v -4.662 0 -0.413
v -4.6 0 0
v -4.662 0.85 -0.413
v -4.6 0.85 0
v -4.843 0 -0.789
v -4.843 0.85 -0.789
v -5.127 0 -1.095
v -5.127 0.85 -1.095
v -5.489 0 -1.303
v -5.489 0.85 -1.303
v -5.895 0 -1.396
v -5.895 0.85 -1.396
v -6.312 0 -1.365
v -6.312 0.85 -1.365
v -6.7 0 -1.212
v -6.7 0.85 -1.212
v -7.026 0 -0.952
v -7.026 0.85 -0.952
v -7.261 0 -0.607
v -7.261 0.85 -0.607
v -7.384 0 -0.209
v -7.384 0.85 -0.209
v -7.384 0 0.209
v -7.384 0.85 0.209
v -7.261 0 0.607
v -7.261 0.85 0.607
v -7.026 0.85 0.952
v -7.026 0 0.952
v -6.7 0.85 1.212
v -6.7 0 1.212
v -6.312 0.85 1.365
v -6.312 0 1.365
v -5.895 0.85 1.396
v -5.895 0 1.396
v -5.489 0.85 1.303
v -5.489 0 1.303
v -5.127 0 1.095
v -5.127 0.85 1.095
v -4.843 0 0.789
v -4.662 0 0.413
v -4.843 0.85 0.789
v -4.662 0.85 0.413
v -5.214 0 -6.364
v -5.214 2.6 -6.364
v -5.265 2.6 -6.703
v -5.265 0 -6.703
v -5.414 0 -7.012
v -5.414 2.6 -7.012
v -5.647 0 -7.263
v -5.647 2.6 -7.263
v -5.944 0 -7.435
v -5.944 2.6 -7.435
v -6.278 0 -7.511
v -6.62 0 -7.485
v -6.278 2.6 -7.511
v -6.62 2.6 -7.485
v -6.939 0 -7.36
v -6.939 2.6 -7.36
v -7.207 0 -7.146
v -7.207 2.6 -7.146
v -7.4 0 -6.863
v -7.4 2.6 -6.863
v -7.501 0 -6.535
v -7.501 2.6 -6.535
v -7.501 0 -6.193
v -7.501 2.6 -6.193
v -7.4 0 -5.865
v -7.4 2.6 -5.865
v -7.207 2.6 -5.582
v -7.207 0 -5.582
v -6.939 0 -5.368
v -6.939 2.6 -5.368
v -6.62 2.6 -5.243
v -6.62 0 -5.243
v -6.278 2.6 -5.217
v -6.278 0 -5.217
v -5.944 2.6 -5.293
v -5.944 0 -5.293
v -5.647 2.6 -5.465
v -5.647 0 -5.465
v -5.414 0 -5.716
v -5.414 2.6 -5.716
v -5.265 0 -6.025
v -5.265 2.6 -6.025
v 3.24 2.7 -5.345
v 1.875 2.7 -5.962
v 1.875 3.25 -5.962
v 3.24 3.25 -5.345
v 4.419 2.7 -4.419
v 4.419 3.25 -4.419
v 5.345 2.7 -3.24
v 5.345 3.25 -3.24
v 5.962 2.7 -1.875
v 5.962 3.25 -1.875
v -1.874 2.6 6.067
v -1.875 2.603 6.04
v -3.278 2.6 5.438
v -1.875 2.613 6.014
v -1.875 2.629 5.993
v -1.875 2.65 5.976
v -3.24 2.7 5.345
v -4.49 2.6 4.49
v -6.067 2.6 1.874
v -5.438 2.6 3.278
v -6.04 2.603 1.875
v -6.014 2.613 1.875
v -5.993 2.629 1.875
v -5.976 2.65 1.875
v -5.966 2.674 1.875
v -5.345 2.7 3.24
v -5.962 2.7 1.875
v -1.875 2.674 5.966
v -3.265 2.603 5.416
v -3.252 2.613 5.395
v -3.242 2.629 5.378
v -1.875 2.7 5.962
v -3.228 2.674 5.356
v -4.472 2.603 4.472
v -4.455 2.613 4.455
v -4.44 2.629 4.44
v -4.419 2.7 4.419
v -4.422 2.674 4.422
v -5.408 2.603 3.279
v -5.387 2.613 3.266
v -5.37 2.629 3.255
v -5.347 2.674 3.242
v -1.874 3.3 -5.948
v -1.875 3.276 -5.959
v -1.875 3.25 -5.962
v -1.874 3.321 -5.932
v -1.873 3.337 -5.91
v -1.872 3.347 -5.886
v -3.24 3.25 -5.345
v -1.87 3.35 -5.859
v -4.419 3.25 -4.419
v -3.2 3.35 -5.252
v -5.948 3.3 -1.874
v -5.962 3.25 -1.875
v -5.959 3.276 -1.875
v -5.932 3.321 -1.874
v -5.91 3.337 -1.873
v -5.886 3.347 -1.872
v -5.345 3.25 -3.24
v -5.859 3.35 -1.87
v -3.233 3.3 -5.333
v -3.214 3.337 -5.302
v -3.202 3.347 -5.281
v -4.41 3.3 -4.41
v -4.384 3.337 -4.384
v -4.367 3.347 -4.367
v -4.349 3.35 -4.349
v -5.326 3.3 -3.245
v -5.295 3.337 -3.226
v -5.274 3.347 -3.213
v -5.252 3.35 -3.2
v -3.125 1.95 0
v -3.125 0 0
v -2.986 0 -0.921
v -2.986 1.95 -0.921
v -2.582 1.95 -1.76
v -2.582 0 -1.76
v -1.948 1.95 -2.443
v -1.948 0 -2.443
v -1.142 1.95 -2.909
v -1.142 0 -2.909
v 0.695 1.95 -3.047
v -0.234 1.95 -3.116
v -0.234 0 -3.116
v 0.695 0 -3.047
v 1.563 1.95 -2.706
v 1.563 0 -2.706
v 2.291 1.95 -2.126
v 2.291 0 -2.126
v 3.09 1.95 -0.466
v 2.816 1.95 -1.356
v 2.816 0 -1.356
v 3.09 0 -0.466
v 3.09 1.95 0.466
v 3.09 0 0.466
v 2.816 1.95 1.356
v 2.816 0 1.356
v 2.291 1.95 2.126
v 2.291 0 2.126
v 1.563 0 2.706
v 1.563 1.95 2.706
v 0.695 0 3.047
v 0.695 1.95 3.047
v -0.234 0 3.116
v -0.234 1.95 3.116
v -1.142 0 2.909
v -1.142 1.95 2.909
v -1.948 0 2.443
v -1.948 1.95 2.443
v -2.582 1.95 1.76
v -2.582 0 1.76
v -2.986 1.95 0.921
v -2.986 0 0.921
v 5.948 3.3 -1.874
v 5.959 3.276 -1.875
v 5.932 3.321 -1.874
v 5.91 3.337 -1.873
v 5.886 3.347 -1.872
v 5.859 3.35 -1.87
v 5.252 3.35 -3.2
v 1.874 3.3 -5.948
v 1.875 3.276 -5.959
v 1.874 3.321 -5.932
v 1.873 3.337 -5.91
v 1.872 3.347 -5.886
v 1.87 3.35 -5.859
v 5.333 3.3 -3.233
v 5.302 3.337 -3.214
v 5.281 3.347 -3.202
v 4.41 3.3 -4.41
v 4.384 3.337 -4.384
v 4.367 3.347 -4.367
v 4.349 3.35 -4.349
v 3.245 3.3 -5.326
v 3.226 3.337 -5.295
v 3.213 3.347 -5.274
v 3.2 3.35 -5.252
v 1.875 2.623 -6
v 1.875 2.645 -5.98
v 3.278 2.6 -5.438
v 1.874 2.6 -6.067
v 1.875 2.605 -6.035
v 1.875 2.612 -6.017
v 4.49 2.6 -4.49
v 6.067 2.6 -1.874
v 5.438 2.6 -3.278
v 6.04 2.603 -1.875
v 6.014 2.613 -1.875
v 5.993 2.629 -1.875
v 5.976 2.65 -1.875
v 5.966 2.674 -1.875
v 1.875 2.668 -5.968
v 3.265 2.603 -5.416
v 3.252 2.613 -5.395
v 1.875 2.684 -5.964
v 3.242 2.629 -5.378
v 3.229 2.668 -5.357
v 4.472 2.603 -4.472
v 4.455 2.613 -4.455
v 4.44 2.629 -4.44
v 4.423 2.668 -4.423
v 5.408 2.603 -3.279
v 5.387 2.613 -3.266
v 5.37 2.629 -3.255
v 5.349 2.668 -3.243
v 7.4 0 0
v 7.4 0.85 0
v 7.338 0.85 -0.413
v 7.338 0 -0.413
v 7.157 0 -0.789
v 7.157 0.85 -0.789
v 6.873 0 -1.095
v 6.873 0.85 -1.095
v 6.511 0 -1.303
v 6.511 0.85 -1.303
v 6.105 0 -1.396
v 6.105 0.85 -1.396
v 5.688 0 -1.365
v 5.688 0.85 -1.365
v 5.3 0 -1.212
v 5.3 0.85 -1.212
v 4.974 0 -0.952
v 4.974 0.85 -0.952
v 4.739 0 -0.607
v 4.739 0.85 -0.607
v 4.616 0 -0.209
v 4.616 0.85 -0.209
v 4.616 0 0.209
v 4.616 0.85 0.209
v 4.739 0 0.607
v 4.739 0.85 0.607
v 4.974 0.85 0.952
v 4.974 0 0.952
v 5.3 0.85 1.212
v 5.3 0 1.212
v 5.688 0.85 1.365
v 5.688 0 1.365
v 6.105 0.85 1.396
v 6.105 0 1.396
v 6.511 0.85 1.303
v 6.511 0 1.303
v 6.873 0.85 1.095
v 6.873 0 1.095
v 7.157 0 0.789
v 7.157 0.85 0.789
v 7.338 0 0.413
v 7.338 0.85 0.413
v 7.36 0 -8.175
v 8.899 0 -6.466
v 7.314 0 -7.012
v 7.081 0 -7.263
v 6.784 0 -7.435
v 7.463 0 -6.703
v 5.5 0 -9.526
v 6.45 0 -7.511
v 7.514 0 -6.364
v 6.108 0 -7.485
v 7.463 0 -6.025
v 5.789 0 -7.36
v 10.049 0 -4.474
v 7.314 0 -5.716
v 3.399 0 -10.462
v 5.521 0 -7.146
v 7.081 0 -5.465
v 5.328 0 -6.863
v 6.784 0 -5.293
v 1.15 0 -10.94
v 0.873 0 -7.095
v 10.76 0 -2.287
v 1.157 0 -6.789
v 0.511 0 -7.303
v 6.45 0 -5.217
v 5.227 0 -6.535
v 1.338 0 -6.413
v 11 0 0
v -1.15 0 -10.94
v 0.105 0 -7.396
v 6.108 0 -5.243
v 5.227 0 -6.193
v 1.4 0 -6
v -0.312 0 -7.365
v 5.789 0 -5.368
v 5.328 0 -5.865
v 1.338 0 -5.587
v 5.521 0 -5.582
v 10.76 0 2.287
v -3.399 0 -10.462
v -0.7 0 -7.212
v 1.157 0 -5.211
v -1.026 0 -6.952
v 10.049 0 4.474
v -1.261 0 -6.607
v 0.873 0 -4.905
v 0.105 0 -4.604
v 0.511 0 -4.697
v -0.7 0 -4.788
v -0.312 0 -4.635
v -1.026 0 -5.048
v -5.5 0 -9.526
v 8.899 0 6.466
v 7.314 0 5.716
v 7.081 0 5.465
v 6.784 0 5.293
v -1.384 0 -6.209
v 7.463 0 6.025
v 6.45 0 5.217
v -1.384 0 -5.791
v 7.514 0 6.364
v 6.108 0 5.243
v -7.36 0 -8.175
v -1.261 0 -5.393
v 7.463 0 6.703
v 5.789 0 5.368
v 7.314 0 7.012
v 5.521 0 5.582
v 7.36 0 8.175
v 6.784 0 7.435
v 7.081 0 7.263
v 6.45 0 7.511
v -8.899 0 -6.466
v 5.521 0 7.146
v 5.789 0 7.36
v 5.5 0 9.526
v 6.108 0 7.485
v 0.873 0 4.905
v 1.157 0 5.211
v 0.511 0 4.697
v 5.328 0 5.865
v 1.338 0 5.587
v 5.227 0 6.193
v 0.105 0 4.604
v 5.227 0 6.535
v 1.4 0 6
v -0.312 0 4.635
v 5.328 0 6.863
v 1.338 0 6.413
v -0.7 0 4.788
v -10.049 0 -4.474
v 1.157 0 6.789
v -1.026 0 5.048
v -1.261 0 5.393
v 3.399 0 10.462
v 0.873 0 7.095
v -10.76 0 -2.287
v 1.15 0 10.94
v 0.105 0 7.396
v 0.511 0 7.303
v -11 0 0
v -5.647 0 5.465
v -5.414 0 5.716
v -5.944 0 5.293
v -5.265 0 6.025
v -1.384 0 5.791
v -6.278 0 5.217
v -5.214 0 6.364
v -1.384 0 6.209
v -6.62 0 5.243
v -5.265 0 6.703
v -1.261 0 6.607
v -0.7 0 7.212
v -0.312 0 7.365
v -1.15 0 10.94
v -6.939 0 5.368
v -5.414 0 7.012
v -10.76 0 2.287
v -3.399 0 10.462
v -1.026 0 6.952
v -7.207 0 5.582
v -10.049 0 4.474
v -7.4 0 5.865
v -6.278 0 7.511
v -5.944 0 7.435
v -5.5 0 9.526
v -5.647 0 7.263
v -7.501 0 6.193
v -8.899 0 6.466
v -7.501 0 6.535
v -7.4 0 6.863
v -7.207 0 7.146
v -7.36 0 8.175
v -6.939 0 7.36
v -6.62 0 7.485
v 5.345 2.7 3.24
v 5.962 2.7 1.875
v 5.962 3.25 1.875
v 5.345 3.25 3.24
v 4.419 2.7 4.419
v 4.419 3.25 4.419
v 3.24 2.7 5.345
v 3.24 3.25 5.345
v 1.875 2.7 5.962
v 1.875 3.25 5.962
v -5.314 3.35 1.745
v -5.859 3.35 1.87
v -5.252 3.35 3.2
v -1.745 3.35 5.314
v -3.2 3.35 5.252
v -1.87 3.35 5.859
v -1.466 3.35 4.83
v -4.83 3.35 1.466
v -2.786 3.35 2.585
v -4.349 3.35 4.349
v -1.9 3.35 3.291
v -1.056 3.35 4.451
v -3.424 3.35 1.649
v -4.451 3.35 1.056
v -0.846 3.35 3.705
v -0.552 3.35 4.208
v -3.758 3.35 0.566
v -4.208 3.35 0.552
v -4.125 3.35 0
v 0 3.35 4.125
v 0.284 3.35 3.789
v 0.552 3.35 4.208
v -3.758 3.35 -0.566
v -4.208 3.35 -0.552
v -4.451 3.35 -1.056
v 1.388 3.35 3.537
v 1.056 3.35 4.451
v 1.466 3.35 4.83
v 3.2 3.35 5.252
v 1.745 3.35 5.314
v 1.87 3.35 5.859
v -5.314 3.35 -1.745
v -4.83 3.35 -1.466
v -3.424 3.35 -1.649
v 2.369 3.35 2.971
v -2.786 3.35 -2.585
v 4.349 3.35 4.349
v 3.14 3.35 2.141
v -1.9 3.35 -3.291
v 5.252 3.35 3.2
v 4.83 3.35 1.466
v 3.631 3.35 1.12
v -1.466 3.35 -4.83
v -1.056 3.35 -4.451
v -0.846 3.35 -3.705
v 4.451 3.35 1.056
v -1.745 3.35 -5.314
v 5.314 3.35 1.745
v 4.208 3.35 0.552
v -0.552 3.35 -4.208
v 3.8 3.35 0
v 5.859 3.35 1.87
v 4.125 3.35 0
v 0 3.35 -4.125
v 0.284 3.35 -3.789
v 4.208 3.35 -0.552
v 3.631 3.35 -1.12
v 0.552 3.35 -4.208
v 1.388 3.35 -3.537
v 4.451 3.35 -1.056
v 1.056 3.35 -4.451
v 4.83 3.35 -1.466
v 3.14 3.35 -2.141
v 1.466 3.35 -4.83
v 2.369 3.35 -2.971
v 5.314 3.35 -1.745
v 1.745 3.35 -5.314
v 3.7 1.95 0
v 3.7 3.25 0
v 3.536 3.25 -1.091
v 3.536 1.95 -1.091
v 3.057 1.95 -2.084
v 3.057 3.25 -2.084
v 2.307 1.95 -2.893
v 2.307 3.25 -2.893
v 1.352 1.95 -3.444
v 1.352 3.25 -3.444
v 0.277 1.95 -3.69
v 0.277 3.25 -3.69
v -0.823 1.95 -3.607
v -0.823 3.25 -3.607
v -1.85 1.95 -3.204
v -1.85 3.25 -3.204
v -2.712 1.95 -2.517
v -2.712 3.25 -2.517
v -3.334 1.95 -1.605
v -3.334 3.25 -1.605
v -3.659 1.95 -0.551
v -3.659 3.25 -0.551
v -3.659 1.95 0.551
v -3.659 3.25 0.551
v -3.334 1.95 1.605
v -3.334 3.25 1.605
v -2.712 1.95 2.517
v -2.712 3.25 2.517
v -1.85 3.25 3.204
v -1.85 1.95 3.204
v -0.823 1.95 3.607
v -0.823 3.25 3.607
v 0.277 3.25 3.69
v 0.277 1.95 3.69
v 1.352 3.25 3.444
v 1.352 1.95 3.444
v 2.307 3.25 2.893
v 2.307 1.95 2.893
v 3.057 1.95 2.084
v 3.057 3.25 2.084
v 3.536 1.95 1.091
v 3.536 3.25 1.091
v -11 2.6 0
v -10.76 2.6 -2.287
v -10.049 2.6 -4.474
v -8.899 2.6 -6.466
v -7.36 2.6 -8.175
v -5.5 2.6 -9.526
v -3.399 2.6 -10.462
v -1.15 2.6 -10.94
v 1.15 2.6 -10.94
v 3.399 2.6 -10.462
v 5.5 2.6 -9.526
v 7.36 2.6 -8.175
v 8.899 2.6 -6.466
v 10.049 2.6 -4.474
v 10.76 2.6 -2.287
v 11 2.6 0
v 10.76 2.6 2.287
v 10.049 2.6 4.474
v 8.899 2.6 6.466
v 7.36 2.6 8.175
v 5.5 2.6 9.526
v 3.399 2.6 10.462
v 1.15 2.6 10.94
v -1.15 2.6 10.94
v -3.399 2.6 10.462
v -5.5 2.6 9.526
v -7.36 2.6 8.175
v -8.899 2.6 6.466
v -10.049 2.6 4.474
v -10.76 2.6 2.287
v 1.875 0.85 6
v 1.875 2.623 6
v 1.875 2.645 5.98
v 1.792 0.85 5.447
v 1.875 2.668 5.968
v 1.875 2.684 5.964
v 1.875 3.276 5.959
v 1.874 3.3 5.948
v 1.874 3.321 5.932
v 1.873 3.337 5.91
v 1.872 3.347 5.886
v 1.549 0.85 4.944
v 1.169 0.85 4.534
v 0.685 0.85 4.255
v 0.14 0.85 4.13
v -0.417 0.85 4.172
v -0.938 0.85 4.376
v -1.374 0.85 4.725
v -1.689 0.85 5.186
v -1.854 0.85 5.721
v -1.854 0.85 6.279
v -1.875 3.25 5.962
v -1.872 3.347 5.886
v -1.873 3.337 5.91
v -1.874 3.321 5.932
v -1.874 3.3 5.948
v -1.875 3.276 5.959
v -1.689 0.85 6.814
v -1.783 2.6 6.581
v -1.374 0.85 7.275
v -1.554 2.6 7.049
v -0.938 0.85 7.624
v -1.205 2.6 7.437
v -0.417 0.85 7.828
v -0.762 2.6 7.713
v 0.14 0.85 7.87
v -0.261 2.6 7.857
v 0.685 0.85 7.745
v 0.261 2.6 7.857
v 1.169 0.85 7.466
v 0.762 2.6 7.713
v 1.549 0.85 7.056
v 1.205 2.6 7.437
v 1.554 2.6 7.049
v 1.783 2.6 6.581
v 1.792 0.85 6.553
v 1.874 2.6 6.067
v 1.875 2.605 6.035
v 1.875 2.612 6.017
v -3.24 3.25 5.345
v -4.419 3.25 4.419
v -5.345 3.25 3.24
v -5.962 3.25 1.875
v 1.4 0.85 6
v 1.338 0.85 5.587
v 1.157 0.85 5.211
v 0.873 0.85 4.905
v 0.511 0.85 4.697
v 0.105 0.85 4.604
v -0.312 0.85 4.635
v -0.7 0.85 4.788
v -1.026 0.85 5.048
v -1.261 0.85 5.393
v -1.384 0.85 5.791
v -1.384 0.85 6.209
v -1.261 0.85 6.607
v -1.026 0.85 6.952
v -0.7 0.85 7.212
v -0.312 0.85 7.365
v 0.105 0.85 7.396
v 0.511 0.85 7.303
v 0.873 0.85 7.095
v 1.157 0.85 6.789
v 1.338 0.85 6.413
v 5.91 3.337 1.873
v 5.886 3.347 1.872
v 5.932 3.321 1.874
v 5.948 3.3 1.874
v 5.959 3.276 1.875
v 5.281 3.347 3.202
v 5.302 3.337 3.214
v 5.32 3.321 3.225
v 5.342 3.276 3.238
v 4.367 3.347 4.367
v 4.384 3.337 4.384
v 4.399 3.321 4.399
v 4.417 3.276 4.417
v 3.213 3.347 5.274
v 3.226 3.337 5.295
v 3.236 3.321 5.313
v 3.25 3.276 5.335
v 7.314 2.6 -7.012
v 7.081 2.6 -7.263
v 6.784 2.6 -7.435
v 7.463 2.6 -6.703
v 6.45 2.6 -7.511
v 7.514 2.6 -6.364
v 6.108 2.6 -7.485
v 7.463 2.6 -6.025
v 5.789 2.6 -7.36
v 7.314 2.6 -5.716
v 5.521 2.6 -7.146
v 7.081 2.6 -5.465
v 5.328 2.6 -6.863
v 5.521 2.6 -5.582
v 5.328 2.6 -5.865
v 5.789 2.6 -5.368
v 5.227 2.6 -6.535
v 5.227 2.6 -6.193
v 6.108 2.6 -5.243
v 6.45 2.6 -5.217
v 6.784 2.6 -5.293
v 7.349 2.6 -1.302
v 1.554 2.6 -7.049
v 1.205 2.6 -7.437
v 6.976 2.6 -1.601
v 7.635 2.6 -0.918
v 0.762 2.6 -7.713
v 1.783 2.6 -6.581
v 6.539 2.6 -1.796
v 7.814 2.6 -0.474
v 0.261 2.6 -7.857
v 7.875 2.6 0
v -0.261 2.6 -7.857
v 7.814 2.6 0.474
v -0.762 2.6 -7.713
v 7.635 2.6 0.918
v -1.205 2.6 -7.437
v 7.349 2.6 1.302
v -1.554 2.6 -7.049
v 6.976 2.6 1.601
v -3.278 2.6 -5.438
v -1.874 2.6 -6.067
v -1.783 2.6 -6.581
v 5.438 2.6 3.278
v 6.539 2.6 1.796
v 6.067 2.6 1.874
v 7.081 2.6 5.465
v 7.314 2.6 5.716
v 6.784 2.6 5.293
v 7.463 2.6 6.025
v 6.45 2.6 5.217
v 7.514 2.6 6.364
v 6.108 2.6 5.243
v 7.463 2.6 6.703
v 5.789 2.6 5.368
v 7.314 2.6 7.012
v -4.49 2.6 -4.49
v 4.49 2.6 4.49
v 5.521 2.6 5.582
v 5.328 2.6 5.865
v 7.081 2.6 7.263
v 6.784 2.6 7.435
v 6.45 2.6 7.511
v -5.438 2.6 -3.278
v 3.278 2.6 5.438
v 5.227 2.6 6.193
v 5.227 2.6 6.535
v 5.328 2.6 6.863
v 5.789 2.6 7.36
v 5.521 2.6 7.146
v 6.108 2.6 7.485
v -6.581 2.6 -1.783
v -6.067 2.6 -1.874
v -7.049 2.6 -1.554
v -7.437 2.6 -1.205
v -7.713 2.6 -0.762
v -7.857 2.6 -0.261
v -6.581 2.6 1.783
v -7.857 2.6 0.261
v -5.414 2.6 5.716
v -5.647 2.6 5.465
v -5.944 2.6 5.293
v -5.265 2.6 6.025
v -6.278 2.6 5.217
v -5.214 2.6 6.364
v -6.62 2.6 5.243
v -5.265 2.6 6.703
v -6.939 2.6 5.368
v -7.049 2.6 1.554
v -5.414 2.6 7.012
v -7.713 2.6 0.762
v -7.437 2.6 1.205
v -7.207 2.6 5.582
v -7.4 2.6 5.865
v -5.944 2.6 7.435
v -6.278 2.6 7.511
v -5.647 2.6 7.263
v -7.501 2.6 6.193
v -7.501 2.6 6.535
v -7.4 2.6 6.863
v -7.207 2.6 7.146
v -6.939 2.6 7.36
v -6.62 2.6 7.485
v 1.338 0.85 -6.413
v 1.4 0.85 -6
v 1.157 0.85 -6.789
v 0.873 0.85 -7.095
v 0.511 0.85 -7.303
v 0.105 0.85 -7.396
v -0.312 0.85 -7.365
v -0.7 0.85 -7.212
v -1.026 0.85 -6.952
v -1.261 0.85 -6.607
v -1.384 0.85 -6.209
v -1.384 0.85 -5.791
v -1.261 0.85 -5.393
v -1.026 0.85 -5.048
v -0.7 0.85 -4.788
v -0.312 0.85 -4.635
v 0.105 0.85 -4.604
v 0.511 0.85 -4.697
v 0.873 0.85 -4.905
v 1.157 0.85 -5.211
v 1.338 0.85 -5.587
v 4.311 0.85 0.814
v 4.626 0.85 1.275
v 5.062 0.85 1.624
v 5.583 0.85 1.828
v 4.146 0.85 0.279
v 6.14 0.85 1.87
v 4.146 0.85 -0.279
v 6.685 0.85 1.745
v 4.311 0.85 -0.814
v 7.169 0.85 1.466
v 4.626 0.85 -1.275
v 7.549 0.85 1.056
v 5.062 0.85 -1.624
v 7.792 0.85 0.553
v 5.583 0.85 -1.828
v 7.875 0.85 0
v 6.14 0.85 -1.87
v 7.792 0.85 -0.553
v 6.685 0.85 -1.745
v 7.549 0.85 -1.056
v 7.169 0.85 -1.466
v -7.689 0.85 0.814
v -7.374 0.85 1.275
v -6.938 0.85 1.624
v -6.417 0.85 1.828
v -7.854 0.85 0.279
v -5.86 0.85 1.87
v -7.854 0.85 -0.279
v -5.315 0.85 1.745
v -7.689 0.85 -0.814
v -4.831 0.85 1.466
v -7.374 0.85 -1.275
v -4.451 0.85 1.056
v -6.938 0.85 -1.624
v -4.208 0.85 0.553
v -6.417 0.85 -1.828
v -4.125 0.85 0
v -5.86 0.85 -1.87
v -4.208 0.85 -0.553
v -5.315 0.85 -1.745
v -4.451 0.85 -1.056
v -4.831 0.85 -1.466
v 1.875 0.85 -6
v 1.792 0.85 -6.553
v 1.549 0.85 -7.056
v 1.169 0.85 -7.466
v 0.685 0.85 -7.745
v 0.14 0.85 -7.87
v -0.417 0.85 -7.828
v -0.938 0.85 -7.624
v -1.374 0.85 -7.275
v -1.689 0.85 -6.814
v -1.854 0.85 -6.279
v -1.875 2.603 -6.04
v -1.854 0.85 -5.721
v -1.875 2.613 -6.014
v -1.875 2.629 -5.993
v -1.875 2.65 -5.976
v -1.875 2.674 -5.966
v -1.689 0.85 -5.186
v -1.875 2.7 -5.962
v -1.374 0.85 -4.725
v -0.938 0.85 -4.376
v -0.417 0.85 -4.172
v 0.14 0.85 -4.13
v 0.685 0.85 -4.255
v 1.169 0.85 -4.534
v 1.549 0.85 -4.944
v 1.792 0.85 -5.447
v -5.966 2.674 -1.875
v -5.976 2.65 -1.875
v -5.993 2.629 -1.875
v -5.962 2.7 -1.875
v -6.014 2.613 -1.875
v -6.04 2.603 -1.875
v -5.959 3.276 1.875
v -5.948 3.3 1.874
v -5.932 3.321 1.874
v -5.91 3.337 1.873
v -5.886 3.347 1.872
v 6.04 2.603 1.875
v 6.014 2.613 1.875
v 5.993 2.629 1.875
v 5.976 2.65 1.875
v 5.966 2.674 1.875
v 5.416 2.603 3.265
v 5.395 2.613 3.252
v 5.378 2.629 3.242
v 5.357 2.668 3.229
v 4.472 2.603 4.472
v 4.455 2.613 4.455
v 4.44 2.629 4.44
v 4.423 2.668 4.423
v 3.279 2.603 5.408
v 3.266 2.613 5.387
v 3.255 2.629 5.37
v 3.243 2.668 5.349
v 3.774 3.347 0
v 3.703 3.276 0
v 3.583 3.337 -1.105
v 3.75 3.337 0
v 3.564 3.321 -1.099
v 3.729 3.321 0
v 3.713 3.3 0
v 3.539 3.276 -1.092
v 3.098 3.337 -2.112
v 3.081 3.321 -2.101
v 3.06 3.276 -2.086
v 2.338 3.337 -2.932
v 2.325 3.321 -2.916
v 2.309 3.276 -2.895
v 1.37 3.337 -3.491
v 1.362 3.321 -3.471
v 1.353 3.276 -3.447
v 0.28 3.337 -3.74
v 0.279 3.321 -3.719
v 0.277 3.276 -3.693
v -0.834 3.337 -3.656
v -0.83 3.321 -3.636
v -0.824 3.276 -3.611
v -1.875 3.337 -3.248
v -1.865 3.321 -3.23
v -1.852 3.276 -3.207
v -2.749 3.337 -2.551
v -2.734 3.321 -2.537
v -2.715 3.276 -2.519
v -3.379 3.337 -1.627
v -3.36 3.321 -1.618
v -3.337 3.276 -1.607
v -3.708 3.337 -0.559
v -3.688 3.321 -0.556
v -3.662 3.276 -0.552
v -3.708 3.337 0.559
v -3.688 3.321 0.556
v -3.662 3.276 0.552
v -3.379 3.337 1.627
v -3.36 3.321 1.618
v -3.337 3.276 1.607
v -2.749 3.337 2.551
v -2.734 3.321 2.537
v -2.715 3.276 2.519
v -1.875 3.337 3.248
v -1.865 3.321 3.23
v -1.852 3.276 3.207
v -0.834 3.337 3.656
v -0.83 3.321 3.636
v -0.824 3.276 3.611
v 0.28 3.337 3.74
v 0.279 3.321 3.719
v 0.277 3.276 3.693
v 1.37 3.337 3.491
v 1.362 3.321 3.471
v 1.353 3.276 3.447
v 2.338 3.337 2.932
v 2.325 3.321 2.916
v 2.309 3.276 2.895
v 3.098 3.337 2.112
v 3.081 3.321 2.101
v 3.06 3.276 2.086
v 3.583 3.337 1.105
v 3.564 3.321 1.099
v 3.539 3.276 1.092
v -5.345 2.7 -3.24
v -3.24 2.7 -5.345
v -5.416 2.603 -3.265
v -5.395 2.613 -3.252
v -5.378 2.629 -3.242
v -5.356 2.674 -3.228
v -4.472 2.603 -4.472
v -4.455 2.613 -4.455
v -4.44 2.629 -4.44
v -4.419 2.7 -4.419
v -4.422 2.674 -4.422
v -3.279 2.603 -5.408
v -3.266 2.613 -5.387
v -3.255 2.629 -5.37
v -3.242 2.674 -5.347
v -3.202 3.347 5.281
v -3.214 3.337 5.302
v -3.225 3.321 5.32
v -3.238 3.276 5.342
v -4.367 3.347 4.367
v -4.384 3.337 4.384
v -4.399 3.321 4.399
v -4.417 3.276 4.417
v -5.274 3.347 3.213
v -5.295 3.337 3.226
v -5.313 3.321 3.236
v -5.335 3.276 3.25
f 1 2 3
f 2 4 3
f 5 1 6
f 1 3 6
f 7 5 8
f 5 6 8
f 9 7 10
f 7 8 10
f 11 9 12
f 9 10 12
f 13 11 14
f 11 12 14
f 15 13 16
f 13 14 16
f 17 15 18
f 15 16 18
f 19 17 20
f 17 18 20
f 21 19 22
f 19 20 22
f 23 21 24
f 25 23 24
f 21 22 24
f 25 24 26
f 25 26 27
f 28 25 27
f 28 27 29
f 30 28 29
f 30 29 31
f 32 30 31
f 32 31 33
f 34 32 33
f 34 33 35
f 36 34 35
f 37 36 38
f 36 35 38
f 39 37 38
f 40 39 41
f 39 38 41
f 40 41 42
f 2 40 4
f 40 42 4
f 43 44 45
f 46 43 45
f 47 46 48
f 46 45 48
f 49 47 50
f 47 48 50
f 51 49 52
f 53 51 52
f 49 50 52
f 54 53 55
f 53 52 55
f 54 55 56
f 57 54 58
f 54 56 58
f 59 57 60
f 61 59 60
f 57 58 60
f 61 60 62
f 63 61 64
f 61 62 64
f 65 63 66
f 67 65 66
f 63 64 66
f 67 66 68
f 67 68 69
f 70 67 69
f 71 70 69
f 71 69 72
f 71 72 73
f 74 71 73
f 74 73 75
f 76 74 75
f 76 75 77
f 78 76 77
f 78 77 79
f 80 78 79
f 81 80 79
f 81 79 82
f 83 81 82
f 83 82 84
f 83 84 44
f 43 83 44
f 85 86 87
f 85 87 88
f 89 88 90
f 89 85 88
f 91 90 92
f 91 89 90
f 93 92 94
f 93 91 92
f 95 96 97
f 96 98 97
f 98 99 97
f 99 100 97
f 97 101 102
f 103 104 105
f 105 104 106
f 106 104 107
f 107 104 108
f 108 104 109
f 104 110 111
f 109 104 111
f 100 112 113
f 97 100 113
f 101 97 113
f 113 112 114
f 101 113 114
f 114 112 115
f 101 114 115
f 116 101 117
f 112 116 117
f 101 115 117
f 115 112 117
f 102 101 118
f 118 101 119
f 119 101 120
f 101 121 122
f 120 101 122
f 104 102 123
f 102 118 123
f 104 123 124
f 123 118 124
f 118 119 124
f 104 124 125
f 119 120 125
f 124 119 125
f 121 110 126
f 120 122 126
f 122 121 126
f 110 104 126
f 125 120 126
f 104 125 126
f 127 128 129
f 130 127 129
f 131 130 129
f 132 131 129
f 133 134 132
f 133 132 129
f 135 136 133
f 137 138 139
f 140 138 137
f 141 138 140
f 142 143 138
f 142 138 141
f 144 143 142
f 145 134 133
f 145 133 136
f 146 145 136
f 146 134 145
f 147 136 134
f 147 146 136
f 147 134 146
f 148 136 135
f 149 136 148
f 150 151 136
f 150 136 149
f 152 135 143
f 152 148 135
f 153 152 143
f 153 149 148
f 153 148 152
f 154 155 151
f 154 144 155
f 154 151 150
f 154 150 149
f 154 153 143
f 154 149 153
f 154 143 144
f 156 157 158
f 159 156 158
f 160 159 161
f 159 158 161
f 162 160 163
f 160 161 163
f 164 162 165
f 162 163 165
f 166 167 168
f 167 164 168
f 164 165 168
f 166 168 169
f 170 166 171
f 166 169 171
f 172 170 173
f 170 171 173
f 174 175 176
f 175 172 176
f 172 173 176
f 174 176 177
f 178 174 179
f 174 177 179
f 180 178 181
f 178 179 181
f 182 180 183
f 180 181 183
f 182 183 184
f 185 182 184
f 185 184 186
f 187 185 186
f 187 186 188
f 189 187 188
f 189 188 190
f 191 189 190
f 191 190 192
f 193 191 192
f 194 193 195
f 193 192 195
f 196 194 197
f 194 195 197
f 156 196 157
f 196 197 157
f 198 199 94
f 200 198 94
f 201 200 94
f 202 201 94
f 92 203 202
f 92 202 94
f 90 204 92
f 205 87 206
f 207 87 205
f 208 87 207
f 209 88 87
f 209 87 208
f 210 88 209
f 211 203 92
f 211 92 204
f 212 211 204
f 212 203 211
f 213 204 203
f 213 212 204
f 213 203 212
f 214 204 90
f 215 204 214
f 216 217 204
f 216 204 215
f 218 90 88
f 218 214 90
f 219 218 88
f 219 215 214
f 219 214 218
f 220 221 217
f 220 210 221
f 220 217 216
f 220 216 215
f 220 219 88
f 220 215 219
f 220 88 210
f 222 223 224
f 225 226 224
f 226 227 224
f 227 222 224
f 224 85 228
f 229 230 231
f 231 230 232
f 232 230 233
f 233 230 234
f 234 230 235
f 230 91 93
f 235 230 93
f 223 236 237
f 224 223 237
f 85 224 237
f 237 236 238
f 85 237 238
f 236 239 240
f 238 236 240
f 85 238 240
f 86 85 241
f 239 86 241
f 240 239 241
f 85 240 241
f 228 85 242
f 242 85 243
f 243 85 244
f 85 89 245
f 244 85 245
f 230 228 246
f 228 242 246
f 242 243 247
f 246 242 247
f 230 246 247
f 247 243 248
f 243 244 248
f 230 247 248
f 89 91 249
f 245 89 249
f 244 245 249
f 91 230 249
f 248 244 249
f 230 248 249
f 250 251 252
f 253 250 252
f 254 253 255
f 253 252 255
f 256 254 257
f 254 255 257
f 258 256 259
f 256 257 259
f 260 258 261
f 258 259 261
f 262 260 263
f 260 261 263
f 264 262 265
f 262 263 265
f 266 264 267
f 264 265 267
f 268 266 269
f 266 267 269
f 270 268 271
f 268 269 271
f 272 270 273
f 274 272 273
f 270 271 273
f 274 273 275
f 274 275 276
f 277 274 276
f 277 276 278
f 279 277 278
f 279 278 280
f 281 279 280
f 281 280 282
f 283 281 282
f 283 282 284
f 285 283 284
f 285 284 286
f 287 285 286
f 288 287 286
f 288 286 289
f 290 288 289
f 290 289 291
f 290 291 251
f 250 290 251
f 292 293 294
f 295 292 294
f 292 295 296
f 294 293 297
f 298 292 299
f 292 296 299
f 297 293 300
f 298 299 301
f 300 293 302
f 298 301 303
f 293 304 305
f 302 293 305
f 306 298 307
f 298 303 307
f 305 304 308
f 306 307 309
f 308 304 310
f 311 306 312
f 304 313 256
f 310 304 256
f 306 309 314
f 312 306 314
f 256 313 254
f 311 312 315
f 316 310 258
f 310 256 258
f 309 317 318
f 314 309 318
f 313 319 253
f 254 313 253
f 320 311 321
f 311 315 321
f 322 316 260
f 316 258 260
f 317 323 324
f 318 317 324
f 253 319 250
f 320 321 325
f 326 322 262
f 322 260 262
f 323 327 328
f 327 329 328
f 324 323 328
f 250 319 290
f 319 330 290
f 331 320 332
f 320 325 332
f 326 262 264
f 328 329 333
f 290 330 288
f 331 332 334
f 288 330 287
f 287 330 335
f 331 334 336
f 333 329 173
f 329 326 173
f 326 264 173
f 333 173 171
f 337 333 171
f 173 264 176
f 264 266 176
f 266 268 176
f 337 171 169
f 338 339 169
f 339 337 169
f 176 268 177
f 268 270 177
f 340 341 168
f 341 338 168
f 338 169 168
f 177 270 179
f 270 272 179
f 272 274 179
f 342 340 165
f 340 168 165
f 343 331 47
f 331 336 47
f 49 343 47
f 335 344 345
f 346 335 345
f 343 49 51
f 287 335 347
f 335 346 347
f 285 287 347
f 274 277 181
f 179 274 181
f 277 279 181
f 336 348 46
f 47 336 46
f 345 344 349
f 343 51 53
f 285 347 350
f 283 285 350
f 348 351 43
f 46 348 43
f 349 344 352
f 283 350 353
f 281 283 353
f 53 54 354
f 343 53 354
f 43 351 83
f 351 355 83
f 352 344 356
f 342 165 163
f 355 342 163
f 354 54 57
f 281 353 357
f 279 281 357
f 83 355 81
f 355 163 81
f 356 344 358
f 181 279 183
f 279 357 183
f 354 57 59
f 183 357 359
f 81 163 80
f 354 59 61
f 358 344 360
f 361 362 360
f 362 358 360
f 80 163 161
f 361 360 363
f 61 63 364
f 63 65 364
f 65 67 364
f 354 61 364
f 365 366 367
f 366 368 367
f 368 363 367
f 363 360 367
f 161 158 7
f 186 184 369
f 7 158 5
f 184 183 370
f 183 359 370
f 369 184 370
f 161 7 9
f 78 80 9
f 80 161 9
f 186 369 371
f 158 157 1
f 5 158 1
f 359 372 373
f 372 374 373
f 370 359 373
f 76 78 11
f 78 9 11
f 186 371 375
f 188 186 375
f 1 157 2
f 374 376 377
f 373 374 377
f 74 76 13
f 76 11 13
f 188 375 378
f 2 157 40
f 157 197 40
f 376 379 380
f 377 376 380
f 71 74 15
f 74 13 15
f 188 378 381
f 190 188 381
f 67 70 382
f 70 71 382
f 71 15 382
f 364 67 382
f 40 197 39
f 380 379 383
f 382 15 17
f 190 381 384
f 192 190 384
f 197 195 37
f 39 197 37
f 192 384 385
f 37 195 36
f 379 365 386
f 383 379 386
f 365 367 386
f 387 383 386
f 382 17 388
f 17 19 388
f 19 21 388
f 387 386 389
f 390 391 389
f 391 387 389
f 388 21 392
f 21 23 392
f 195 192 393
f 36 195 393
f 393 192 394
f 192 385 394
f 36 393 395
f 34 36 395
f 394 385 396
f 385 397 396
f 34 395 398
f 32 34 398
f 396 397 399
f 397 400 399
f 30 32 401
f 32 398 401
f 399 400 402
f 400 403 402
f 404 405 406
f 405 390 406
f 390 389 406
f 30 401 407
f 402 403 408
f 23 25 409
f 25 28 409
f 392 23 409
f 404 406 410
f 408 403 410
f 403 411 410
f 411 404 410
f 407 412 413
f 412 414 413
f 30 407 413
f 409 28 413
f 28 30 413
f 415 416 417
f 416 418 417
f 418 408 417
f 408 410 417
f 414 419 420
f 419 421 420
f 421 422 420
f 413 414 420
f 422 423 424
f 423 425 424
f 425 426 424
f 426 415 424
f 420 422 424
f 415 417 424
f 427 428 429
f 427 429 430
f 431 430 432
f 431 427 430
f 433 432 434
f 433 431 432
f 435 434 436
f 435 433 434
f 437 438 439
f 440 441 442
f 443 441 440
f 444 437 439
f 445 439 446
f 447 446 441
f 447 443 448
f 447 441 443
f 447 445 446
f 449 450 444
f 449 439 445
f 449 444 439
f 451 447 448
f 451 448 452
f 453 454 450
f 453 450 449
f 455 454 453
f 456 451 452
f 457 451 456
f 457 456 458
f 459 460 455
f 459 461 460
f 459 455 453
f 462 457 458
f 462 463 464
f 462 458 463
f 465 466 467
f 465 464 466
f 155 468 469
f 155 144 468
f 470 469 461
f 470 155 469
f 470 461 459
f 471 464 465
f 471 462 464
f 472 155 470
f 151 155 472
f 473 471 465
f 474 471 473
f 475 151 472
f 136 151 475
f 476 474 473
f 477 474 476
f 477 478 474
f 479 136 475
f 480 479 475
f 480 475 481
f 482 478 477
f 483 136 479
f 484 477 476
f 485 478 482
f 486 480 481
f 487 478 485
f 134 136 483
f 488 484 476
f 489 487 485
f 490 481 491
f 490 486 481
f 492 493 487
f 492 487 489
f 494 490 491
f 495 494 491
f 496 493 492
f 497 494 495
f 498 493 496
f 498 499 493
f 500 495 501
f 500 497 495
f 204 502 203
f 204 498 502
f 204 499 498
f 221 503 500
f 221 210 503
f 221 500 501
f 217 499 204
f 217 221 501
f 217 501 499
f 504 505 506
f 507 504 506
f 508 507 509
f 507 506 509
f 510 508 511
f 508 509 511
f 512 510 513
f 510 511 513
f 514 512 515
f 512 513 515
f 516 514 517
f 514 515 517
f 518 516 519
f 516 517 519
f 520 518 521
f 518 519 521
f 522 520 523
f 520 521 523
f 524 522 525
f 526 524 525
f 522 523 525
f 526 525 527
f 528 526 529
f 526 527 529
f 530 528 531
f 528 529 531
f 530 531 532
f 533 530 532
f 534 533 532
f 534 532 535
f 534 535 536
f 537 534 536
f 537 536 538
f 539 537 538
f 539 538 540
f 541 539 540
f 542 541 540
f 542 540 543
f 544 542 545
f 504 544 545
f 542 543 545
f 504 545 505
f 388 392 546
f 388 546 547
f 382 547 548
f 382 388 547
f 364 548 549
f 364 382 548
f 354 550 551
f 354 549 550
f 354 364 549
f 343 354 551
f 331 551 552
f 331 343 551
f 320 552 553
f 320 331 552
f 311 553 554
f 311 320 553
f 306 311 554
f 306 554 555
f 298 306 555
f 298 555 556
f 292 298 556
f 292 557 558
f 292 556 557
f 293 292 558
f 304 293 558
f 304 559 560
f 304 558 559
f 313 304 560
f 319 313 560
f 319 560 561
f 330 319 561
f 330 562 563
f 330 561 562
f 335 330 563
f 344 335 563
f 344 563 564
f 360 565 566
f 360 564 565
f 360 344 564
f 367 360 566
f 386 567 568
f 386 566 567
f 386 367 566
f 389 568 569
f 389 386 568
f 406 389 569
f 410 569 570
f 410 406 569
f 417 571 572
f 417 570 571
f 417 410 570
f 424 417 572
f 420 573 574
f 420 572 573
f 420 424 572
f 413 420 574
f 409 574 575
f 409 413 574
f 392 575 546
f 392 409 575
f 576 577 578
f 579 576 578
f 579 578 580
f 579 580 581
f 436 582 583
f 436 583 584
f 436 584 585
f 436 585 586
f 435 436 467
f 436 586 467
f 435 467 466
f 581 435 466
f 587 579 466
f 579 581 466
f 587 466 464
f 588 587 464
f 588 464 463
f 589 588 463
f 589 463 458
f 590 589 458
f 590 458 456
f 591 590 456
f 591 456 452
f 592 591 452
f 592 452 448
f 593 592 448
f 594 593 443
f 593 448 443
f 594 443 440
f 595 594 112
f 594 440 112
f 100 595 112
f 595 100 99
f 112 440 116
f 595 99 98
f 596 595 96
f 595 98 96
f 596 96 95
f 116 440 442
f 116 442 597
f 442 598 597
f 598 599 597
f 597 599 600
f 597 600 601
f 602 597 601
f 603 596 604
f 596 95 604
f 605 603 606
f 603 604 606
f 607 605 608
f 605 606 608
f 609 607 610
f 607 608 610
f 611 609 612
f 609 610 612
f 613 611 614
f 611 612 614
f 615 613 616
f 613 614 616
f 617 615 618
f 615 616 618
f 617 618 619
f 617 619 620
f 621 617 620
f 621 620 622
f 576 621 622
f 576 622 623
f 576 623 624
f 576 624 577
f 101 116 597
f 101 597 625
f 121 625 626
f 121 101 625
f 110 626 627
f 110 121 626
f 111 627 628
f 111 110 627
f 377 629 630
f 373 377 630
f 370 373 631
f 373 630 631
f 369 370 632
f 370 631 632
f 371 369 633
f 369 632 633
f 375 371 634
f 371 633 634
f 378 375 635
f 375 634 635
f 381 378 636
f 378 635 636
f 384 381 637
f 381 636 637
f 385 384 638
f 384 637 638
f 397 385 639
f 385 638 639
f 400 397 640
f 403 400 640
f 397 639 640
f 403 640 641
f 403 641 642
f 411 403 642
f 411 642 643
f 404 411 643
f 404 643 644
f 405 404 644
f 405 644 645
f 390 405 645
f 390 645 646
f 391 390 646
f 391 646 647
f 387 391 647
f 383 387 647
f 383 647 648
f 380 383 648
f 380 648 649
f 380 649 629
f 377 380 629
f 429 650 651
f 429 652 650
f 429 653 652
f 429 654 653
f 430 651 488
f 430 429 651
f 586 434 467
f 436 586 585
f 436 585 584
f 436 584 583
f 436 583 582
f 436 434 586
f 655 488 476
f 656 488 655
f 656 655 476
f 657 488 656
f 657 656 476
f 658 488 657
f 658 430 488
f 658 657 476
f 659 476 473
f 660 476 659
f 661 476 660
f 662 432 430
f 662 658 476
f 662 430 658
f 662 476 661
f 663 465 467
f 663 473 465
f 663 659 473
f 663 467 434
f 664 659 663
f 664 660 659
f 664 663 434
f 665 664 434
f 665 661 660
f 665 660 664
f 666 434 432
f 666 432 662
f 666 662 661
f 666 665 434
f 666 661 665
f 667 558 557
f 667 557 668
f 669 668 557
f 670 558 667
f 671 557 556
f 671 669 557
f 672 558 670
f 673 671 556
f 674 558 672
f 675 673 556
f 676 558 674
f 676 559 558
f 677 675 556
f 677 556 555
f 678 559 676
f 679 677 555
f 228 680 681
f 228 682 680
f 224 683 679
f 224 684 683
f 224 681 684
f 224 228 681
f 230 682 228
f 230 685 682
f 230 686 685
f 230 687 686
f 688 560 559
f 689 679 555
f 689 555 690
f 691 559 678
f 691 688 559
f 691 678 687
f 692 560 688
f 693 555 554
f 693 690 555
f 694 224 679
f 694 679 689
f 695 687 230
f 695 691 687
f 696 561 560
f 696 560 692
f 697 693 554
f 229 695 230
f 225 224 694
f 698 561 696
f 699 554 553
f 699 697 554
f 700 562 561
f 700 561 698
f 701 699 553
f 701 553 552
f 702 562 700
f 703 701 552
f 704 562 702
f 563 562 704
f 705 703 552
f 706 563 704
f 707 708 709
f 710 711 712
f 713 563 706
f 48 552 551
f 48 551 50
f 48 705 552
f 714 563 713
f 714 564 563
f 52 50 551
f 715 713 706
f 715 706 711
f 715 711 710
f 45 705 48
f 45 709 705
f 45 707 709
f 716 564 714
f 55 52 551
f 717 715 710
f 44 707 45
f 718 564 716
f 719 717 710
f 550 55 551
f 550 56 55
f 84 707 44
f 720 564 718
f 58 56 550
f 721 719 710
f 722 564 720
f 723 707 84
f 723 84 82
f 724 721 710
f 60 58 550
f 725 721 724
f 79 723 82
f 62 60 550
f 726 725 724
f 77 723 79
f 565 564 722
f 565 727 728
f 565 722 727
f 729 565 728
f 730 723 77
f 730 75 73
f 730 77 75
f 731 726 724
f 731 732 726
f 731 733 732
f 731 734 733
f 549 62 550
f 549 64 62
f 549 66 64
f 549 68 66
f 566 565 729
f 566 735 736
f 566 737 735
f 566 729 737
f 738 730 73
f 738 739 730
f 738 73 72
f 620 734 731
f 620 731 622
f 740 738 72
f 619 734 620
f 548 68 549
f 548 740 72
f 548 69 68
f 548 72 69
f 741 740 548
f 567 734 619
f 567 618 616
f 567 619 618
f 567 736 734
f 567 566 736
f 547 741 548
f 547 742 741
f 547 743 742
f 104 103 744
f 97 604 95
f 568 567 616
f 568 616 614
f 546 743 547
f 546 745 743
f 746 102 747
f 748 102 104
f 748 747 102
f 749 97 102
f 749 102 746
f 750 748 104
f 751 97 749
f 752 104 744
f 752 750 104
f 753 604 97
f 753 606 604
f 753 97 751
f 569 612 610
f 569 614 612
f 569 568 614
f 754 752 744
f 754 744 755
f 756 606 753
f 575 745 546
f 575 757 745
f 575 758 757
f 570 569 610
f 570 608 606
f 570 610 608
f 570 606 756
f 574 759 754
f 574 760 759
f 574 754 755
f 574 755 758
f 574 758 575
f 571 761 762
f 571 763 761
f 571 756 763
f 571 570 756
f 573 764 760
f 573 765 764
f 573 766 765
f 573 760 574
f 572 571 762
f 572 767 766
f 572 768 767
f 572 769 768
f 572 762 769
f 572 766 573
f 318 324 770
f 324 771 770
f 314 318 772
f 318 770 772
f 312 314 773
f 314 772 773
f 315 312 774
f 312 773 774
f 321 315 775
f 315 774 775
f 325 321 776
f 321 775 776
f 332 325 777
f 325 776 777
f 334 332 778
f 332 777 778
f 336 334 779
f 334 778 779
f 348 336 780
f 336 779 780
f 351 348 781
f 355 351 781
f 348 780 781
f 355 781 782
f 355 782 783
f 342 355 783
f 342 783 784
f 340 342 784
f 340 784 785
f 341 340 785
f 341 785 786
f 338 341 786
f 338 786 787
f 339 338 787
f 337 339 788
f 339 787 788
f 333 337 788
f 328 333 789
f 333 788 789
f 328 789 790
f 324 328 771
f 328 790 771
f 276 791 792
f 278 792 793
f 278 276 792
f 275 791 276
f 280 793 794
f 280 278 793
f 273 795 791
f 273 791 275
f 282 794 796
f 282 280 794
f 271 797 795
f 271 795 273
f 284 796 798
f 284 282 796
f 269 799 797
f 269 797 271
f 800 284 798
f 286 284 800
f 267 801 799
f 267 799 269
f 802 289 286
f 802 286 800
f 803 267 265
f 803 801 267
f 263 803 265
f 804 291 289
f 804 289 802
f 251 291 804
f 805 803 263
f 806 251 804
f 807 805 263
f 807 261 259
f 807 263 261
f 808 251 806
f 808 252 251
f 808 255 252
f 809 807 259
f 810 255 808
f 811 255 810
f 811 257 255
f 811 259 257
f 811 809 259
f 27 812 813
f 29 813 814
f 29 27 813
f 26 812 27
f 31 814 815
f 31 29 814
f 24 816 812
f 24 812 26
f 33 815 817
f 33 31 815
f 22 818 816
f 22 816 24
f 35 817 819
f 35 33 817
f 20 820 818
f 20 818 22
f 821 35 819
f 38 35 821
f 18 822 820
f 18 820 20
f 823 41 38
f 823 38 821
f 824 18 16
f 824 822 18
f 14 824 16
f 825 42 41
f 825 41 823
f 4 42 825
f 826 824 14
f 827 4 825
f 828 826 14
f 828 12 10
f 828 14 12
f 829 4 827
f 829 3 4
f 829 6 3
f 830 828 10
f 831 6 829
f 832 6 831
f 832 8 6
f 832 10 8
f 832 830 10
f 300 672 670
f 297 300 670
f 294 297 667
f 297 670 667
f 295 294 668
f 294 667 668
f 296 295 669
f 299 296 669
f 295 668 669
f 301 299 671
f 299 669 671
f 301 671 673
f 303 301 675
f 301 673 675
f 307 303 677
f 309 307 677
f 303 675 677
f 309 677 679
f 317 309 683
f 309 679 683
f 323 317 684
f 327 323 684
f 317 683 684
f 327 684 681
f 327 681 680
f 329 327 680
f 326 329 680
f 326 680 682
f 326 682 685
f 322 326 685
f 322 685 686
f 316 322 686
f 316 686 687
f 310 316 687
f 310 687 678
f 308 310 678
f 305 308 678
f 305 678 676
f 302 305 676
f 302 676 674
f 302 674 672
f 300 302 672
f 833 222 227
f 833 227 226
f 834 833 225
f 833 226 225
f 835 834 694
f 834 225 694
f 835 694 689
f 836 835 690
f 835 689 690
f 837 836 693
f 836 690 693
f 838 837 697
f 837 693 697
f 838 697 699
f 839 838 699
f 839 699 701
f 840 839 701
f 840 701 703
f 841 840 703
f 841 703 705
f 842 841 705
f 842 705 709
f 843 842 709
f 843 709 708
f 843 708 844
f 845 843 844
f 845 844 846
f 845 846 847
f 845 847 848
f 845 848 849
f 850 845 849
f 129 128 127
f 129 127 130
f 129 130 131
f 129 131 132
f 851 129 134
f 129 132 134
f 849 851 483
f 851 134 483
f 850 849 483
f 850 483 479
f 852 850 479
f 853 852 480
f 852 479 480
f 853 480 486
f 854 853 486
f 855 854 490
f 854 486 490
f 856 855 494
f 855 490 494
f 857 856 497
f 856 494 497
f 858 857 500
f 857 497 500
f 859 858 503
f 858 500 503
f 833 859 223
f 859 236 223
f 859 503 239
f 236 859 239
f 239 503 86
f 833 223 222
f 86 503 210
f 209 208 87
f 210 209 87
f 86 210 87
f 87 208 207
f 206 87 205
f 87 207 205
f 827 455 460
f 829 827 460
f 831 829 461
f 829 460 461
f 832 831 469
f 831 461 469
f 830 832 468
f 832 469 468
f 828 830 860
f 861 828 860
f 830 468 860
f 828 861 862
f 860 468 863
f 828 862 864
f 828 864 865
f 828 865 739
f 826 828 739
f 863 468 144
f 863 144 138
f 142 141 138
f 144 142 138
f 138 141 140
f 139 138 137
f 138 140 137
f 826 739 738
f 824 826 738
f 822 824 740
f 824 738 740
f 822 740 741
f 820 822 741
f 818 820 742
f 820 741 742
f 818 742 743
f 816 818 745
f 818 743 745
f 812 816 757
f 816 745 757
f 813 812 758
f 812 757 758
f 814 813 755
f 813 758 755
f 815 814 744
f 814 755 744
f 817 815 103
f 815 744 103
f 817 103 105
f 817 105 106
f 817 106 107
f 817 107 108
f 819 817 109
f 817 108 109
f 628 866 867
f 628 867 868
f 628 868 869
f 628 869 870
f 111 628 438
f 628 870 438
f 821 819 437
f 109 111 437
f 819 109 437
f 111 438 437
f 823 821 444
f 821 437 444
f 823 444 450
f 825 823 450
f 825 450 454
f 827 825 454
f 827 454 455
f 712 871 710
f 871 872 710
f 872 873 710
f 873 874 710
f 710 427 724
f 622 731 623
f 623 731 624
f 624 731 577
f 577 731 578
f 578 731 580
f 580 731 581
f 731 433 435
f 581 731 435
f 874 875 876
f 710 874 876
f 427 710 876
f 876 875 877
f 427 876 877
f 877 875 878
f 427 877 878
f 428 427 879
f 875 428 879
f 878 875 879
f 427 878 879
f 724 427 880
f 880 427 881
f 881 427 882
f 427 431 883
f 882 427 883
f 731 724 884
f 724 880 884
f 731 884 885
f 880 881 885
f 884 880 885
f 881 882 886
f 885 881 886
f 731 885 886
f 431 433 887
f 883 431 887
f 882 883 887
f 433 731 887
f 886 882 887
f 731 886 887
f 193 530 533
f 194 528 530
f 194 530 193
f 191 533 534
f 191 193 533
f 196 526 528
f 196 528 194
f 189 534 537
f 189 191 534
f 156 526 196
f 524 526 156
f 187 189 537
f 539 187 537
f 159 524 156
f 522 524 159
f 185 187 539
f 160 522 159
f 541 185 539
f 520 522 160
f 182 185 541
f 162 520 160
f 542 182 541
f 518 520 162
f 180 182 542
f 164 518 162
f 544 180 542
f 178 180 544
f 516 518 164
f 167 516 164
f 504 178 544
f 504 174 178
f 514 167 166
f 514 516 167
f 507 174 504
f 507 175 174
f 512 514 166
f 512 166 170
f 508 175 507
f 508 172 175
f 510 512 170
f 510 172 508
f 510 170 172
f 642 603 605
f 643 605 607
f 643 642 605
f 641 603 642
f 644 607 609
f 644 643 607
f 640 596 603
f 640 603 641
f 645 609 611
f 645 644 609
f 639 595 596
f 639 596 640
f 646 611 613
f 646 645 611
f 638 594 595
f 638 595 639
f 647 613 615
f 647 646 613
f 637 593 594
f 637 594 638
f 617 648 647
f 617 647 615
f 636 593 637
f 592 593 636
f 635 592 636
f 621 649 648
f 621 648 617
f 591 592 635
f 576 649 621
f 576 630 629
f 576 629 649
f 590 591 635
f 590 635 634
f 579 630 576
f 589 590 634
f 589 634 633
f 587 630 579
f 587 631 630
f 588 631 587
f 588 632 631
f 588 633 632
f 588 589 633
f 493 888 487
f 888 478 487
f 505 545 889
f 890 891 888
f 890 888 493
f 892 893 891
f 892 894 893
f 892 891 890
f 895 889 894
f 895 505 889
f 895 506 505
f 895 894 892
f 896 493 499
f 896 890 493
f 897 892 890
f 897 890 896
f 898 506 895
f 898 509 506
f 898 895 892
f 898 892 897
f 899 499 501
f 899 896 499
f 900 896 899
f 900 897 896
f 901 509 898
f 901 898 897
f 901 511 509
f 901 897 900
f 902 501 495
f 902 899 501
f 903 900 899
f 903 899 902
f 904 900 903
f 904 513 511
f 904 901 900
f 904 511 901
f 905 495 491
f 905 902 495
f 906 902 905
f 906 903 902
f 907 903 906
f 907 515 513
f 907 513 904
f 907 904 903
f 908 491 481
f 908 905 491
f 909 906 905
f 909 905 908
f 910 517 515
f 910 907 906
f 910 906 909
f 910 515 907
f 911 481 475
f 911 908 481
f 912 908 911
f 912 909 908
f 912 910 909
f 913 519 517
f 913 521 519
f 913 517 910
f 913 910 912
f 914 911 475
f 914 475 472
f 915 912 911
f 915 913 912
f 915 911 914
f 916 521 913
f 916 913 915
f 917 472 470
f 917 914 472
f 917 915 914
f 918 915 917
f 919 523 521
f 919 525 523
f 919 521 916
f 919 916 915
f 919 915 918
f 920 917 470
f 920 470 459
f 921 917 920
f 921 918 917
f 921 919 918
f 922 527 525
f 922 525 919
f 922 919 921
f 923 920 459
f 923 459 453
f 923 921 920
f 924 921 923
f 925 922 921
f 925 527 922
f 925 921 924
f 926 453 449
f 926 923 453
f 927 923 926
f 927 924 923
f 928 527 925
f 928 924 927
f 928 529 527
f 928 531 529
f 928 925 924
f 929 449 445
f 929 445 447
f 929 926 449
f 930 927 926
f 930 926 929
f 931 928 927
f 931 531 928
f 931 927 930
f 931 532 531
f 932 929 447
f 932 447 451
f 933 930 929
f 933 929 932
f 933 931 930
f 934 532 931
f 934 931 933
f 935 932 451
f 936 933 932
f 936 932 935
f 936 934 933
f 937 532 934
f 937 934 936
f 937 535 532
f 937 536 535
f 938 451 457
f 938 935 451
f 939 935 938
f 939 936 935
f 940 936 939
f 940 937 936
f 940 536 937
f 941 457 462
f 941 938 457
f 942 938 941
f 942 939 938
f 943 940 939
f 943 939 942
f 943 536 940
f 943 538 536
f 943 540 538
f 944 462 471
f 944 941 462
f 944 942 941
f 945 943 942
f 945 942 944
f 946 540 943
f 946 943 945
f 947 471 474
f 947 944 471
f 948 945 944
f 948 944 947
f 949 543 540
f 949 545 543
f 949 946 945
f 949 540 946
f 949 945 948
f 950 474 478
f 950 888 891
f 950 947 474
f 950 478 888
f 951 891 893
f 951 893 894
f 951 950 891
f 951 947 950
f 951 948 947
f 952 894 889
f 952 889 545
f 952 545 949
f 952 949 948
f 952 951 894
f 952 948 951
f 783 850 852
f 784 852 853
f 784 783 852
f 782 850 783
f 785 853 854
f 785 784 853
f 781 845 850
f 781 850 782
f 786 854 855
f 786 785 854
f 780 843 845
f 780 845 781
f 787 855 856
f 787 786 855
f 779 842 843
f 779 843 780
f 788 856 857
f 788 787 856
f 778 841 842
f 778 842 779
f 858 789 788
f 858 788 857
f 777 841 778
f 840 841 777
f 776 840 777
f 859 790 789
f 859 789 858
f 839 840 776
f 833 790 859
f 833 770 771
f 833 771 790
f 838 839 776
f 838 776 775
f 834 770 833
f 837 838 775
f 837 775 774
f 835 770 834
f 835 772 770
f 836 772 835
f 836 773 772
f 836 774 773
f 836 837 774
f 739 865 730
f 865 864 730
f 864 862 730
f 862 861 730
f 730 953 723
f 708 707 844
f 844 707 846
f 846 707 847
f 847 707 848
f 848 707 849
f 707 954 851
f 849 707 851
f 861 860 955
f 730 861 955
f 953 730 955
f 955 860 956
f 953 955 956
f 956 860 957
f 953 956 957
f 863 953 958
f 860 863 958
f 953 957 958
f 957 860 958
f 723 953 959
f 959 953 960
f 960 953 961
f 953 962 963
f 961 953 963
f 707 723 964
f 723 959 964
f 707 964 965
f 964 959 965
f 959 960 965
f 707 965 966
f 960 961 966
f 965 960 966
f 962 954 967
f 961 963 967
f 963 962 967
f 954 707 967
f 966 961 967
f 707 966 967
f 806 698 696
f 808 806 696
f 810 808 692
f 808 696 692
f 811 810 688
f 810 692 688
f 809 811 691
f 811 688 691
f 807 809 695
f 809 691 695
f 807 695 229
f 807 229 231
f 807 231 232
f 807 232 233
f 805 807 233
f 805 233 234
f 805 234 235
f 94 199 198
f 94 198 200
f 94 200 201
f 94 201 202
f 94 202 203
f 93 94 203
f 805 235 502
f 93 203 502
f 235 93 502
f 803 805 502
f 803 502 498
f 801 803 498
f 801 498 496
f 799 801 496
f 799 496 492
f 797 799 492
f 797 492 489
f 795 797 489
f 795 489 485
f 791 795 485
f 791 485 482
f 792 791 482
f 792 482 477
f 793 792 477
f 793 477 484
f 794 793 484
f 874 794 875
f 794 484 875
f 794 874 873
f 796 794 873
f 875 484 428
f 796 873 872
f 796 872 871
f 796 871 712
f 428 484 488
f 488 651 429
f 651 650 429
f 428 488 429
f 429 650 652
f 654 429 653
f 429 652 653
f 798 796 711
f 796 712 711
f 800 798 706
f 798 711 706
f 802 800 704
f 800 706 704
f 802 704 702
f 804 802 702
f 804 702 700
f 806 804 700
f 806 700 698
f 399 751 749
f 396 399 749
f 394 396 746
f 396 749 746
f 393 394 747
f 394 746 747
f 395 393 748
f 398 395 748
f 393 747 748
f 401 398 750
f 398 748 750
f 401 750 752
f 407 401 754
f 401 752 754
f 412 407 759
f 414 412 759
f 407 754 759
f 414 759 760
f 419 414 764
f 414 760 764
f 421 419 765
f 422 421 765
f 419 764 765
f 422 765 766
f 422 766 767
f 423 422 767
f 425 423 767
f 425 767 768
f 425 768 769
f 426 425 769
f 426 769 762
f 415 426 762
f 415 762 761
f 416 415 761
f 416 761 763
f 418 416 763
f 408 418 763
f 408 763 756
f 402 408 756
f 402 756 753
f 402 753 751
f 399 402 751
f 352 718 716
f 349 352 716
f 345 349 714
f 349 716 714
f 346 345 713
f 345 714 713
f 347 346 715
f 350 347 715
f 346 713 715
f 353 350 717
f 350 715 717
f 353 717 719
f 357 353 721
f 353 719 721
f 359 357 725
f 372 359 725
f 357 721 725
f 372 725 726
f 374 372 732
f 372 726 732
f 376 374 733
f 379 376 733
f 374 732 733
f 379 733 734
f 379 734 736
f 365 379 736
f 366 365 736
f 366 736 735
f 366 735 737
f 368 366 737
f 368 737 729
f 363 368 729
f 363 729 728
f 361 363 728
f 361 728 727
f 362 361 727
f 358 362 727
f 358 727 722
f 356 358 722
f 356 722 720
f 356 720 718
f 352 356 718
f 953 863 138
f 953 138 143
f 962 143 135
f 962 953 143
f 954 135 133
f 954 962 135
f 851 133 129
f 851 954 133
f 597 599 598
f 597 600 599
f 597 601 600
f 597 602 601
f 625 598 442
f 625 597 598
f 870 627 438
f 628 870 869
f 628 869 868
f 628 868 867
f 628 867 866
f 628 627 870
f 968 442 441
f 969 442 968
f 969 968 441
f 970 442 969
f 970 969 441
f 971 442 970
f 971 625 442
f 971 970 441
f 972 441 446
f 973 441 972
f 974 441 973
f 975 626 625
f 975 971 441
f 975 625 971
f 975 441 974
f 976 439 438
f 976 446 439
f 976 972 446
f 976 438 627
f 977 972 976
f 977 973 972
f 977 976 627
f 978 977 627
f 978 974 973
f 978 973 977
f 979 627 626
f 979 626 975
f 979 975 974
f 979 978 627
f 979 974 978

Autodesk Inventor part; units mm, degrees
ref_plane "YZ Plane" through (0, 0, 0) normal (1, 0, 0) x (0, 1, 0)
ref_plane "XZ Plane" through (0, 0, 0) normal (0, 1, 0) x (-1, 0, 0)
ref_plane "XY Plane" through (0, 0, 0) normal (0, 0, 1) x (1, 0, 0)
sketch "Sketch1" plane through (0, 0, 0) normal (0, 1, 0) x (-1, 0, 0)
  circle A0 centre (0, 0) radius 11
  circle A1 centre (0, 0) radius 3.125
  dimension "d0" = 22
  dimension "d1" = 6.25
extrude "Extrusion1" add sketch "Sketch1" along normal blind 2.6
sketch "Sketch2" plane through (0, 2.6, 0) normal (0, 1, 0) x (1, 0, 0)
  circle A0 centre (0, 0) radius 6.25
  circle A1 centre (0, 0) radius 3.125
  dimension "d4" = 12.5
extrude "Extrusion2" add sketch "Sketch2" along normal blind 0.75
sketch "Sketch3" plane through (0, 3.35, 0) normal (0, 1, 0) x (1, 0, 0)
  circle A0 centre (0, 0) radius 3.7
  dimension "d7" = 7.4
extrude "Extrusion3" cut sketch "Sketch3" against normal blind 1.4
sketch "Sketch4" plane through (0, 2.6, 0) normal (0, 1, 0) x (1, 0, 0)
  circle A0 centre (0, 0) radius 11 construction
  line L0 (0, 0) -> (-11, 0)
  circle A1 centre (0, 0) radius 11 projected
  circle A2 centre (-6, 0) radius 1.4
  circle A3 centre (0, -6) radius 1.4
  circle A4 centre (6, 0) radius 1.4
  circle A5 centre (0, 6) radius 1.4
  dimension "d10" = 22
  dimension "d11" = 2.8
  dimension "d12" = 6
  dimension "d15" = 360
extrude "Extrusion4" cut sketch "Sketch4" along normal through all both and the other way through all contours A2 L0 | L0 A2 | A3 | A4 | A5
sketch "Sketch5" plane through (0, 3.35, 0) normal (0, 1, 0) x (1, 0, 0)
  circle A0 centre (-6, 0) radius 1.4 projected
  circle A1 centre (-6, 0) radius 1.875
  circle A2 centre (0, -6) radius 1.875
  circle A3 centre (6, 0) radius 1.875
  circle A4 centre (0, 6) radius 1.875
  point P0 (0, 0)
  dimension "d19" = 3.75
  dimension "d22" = 360
extrude "Extrusion5" cut sketch "Sketch5" against normal blind 2.5 contours A0 | A1 | A2 | A3 | A4
sketch "Sketch6" plane through (0, 2.6, 0) normal (0, 1, 0) x (1, 0, 0)
  line L0 (0, 0) -> (-7.7782, -7.7782) construction
  circle A0 centre (0, 0) radius 11 projected
  line L1 (0, 0) -> (11, 0) construction
  circle A1 centre (0, 0) radius 9 construction
  circle A2 centre (-6.364, -6.364) radius 1.15
  circle A3 centre (6.364, -6.364) radius 1.15
  circle A4 centre (6.364, 6.364) radius 1.15
  circle A5 centre (-6.364, 6.364) radius 1.15
  dimension "d27" = 18
  dimension "d26" = 135
  dimension "d28" = 2.3
  dimension "d31" = 360
extrude "Extrusion6" cut sketch "Sketch6" against normal through all contours A2 | A3 | A4 | A5
fillet "Fillet1" radius 0.1 9 edges at (-3.7, 3.35, 0) (-4.4194, 3.35, 4.4194) (-4.4194, 3.35, -4.4194) (4.4194, 3.35, -4.4194) (4.4194, 3.35, 4.4194) (4.4194, 2.6, 4.4194) (4.4194, 2.6, -4.4194) (-4.4194, 2.6, 4.4194) (-4.4194, 2.6, -4.4194)
properties part number "Motor Plate" material "Aluminum 6061"
